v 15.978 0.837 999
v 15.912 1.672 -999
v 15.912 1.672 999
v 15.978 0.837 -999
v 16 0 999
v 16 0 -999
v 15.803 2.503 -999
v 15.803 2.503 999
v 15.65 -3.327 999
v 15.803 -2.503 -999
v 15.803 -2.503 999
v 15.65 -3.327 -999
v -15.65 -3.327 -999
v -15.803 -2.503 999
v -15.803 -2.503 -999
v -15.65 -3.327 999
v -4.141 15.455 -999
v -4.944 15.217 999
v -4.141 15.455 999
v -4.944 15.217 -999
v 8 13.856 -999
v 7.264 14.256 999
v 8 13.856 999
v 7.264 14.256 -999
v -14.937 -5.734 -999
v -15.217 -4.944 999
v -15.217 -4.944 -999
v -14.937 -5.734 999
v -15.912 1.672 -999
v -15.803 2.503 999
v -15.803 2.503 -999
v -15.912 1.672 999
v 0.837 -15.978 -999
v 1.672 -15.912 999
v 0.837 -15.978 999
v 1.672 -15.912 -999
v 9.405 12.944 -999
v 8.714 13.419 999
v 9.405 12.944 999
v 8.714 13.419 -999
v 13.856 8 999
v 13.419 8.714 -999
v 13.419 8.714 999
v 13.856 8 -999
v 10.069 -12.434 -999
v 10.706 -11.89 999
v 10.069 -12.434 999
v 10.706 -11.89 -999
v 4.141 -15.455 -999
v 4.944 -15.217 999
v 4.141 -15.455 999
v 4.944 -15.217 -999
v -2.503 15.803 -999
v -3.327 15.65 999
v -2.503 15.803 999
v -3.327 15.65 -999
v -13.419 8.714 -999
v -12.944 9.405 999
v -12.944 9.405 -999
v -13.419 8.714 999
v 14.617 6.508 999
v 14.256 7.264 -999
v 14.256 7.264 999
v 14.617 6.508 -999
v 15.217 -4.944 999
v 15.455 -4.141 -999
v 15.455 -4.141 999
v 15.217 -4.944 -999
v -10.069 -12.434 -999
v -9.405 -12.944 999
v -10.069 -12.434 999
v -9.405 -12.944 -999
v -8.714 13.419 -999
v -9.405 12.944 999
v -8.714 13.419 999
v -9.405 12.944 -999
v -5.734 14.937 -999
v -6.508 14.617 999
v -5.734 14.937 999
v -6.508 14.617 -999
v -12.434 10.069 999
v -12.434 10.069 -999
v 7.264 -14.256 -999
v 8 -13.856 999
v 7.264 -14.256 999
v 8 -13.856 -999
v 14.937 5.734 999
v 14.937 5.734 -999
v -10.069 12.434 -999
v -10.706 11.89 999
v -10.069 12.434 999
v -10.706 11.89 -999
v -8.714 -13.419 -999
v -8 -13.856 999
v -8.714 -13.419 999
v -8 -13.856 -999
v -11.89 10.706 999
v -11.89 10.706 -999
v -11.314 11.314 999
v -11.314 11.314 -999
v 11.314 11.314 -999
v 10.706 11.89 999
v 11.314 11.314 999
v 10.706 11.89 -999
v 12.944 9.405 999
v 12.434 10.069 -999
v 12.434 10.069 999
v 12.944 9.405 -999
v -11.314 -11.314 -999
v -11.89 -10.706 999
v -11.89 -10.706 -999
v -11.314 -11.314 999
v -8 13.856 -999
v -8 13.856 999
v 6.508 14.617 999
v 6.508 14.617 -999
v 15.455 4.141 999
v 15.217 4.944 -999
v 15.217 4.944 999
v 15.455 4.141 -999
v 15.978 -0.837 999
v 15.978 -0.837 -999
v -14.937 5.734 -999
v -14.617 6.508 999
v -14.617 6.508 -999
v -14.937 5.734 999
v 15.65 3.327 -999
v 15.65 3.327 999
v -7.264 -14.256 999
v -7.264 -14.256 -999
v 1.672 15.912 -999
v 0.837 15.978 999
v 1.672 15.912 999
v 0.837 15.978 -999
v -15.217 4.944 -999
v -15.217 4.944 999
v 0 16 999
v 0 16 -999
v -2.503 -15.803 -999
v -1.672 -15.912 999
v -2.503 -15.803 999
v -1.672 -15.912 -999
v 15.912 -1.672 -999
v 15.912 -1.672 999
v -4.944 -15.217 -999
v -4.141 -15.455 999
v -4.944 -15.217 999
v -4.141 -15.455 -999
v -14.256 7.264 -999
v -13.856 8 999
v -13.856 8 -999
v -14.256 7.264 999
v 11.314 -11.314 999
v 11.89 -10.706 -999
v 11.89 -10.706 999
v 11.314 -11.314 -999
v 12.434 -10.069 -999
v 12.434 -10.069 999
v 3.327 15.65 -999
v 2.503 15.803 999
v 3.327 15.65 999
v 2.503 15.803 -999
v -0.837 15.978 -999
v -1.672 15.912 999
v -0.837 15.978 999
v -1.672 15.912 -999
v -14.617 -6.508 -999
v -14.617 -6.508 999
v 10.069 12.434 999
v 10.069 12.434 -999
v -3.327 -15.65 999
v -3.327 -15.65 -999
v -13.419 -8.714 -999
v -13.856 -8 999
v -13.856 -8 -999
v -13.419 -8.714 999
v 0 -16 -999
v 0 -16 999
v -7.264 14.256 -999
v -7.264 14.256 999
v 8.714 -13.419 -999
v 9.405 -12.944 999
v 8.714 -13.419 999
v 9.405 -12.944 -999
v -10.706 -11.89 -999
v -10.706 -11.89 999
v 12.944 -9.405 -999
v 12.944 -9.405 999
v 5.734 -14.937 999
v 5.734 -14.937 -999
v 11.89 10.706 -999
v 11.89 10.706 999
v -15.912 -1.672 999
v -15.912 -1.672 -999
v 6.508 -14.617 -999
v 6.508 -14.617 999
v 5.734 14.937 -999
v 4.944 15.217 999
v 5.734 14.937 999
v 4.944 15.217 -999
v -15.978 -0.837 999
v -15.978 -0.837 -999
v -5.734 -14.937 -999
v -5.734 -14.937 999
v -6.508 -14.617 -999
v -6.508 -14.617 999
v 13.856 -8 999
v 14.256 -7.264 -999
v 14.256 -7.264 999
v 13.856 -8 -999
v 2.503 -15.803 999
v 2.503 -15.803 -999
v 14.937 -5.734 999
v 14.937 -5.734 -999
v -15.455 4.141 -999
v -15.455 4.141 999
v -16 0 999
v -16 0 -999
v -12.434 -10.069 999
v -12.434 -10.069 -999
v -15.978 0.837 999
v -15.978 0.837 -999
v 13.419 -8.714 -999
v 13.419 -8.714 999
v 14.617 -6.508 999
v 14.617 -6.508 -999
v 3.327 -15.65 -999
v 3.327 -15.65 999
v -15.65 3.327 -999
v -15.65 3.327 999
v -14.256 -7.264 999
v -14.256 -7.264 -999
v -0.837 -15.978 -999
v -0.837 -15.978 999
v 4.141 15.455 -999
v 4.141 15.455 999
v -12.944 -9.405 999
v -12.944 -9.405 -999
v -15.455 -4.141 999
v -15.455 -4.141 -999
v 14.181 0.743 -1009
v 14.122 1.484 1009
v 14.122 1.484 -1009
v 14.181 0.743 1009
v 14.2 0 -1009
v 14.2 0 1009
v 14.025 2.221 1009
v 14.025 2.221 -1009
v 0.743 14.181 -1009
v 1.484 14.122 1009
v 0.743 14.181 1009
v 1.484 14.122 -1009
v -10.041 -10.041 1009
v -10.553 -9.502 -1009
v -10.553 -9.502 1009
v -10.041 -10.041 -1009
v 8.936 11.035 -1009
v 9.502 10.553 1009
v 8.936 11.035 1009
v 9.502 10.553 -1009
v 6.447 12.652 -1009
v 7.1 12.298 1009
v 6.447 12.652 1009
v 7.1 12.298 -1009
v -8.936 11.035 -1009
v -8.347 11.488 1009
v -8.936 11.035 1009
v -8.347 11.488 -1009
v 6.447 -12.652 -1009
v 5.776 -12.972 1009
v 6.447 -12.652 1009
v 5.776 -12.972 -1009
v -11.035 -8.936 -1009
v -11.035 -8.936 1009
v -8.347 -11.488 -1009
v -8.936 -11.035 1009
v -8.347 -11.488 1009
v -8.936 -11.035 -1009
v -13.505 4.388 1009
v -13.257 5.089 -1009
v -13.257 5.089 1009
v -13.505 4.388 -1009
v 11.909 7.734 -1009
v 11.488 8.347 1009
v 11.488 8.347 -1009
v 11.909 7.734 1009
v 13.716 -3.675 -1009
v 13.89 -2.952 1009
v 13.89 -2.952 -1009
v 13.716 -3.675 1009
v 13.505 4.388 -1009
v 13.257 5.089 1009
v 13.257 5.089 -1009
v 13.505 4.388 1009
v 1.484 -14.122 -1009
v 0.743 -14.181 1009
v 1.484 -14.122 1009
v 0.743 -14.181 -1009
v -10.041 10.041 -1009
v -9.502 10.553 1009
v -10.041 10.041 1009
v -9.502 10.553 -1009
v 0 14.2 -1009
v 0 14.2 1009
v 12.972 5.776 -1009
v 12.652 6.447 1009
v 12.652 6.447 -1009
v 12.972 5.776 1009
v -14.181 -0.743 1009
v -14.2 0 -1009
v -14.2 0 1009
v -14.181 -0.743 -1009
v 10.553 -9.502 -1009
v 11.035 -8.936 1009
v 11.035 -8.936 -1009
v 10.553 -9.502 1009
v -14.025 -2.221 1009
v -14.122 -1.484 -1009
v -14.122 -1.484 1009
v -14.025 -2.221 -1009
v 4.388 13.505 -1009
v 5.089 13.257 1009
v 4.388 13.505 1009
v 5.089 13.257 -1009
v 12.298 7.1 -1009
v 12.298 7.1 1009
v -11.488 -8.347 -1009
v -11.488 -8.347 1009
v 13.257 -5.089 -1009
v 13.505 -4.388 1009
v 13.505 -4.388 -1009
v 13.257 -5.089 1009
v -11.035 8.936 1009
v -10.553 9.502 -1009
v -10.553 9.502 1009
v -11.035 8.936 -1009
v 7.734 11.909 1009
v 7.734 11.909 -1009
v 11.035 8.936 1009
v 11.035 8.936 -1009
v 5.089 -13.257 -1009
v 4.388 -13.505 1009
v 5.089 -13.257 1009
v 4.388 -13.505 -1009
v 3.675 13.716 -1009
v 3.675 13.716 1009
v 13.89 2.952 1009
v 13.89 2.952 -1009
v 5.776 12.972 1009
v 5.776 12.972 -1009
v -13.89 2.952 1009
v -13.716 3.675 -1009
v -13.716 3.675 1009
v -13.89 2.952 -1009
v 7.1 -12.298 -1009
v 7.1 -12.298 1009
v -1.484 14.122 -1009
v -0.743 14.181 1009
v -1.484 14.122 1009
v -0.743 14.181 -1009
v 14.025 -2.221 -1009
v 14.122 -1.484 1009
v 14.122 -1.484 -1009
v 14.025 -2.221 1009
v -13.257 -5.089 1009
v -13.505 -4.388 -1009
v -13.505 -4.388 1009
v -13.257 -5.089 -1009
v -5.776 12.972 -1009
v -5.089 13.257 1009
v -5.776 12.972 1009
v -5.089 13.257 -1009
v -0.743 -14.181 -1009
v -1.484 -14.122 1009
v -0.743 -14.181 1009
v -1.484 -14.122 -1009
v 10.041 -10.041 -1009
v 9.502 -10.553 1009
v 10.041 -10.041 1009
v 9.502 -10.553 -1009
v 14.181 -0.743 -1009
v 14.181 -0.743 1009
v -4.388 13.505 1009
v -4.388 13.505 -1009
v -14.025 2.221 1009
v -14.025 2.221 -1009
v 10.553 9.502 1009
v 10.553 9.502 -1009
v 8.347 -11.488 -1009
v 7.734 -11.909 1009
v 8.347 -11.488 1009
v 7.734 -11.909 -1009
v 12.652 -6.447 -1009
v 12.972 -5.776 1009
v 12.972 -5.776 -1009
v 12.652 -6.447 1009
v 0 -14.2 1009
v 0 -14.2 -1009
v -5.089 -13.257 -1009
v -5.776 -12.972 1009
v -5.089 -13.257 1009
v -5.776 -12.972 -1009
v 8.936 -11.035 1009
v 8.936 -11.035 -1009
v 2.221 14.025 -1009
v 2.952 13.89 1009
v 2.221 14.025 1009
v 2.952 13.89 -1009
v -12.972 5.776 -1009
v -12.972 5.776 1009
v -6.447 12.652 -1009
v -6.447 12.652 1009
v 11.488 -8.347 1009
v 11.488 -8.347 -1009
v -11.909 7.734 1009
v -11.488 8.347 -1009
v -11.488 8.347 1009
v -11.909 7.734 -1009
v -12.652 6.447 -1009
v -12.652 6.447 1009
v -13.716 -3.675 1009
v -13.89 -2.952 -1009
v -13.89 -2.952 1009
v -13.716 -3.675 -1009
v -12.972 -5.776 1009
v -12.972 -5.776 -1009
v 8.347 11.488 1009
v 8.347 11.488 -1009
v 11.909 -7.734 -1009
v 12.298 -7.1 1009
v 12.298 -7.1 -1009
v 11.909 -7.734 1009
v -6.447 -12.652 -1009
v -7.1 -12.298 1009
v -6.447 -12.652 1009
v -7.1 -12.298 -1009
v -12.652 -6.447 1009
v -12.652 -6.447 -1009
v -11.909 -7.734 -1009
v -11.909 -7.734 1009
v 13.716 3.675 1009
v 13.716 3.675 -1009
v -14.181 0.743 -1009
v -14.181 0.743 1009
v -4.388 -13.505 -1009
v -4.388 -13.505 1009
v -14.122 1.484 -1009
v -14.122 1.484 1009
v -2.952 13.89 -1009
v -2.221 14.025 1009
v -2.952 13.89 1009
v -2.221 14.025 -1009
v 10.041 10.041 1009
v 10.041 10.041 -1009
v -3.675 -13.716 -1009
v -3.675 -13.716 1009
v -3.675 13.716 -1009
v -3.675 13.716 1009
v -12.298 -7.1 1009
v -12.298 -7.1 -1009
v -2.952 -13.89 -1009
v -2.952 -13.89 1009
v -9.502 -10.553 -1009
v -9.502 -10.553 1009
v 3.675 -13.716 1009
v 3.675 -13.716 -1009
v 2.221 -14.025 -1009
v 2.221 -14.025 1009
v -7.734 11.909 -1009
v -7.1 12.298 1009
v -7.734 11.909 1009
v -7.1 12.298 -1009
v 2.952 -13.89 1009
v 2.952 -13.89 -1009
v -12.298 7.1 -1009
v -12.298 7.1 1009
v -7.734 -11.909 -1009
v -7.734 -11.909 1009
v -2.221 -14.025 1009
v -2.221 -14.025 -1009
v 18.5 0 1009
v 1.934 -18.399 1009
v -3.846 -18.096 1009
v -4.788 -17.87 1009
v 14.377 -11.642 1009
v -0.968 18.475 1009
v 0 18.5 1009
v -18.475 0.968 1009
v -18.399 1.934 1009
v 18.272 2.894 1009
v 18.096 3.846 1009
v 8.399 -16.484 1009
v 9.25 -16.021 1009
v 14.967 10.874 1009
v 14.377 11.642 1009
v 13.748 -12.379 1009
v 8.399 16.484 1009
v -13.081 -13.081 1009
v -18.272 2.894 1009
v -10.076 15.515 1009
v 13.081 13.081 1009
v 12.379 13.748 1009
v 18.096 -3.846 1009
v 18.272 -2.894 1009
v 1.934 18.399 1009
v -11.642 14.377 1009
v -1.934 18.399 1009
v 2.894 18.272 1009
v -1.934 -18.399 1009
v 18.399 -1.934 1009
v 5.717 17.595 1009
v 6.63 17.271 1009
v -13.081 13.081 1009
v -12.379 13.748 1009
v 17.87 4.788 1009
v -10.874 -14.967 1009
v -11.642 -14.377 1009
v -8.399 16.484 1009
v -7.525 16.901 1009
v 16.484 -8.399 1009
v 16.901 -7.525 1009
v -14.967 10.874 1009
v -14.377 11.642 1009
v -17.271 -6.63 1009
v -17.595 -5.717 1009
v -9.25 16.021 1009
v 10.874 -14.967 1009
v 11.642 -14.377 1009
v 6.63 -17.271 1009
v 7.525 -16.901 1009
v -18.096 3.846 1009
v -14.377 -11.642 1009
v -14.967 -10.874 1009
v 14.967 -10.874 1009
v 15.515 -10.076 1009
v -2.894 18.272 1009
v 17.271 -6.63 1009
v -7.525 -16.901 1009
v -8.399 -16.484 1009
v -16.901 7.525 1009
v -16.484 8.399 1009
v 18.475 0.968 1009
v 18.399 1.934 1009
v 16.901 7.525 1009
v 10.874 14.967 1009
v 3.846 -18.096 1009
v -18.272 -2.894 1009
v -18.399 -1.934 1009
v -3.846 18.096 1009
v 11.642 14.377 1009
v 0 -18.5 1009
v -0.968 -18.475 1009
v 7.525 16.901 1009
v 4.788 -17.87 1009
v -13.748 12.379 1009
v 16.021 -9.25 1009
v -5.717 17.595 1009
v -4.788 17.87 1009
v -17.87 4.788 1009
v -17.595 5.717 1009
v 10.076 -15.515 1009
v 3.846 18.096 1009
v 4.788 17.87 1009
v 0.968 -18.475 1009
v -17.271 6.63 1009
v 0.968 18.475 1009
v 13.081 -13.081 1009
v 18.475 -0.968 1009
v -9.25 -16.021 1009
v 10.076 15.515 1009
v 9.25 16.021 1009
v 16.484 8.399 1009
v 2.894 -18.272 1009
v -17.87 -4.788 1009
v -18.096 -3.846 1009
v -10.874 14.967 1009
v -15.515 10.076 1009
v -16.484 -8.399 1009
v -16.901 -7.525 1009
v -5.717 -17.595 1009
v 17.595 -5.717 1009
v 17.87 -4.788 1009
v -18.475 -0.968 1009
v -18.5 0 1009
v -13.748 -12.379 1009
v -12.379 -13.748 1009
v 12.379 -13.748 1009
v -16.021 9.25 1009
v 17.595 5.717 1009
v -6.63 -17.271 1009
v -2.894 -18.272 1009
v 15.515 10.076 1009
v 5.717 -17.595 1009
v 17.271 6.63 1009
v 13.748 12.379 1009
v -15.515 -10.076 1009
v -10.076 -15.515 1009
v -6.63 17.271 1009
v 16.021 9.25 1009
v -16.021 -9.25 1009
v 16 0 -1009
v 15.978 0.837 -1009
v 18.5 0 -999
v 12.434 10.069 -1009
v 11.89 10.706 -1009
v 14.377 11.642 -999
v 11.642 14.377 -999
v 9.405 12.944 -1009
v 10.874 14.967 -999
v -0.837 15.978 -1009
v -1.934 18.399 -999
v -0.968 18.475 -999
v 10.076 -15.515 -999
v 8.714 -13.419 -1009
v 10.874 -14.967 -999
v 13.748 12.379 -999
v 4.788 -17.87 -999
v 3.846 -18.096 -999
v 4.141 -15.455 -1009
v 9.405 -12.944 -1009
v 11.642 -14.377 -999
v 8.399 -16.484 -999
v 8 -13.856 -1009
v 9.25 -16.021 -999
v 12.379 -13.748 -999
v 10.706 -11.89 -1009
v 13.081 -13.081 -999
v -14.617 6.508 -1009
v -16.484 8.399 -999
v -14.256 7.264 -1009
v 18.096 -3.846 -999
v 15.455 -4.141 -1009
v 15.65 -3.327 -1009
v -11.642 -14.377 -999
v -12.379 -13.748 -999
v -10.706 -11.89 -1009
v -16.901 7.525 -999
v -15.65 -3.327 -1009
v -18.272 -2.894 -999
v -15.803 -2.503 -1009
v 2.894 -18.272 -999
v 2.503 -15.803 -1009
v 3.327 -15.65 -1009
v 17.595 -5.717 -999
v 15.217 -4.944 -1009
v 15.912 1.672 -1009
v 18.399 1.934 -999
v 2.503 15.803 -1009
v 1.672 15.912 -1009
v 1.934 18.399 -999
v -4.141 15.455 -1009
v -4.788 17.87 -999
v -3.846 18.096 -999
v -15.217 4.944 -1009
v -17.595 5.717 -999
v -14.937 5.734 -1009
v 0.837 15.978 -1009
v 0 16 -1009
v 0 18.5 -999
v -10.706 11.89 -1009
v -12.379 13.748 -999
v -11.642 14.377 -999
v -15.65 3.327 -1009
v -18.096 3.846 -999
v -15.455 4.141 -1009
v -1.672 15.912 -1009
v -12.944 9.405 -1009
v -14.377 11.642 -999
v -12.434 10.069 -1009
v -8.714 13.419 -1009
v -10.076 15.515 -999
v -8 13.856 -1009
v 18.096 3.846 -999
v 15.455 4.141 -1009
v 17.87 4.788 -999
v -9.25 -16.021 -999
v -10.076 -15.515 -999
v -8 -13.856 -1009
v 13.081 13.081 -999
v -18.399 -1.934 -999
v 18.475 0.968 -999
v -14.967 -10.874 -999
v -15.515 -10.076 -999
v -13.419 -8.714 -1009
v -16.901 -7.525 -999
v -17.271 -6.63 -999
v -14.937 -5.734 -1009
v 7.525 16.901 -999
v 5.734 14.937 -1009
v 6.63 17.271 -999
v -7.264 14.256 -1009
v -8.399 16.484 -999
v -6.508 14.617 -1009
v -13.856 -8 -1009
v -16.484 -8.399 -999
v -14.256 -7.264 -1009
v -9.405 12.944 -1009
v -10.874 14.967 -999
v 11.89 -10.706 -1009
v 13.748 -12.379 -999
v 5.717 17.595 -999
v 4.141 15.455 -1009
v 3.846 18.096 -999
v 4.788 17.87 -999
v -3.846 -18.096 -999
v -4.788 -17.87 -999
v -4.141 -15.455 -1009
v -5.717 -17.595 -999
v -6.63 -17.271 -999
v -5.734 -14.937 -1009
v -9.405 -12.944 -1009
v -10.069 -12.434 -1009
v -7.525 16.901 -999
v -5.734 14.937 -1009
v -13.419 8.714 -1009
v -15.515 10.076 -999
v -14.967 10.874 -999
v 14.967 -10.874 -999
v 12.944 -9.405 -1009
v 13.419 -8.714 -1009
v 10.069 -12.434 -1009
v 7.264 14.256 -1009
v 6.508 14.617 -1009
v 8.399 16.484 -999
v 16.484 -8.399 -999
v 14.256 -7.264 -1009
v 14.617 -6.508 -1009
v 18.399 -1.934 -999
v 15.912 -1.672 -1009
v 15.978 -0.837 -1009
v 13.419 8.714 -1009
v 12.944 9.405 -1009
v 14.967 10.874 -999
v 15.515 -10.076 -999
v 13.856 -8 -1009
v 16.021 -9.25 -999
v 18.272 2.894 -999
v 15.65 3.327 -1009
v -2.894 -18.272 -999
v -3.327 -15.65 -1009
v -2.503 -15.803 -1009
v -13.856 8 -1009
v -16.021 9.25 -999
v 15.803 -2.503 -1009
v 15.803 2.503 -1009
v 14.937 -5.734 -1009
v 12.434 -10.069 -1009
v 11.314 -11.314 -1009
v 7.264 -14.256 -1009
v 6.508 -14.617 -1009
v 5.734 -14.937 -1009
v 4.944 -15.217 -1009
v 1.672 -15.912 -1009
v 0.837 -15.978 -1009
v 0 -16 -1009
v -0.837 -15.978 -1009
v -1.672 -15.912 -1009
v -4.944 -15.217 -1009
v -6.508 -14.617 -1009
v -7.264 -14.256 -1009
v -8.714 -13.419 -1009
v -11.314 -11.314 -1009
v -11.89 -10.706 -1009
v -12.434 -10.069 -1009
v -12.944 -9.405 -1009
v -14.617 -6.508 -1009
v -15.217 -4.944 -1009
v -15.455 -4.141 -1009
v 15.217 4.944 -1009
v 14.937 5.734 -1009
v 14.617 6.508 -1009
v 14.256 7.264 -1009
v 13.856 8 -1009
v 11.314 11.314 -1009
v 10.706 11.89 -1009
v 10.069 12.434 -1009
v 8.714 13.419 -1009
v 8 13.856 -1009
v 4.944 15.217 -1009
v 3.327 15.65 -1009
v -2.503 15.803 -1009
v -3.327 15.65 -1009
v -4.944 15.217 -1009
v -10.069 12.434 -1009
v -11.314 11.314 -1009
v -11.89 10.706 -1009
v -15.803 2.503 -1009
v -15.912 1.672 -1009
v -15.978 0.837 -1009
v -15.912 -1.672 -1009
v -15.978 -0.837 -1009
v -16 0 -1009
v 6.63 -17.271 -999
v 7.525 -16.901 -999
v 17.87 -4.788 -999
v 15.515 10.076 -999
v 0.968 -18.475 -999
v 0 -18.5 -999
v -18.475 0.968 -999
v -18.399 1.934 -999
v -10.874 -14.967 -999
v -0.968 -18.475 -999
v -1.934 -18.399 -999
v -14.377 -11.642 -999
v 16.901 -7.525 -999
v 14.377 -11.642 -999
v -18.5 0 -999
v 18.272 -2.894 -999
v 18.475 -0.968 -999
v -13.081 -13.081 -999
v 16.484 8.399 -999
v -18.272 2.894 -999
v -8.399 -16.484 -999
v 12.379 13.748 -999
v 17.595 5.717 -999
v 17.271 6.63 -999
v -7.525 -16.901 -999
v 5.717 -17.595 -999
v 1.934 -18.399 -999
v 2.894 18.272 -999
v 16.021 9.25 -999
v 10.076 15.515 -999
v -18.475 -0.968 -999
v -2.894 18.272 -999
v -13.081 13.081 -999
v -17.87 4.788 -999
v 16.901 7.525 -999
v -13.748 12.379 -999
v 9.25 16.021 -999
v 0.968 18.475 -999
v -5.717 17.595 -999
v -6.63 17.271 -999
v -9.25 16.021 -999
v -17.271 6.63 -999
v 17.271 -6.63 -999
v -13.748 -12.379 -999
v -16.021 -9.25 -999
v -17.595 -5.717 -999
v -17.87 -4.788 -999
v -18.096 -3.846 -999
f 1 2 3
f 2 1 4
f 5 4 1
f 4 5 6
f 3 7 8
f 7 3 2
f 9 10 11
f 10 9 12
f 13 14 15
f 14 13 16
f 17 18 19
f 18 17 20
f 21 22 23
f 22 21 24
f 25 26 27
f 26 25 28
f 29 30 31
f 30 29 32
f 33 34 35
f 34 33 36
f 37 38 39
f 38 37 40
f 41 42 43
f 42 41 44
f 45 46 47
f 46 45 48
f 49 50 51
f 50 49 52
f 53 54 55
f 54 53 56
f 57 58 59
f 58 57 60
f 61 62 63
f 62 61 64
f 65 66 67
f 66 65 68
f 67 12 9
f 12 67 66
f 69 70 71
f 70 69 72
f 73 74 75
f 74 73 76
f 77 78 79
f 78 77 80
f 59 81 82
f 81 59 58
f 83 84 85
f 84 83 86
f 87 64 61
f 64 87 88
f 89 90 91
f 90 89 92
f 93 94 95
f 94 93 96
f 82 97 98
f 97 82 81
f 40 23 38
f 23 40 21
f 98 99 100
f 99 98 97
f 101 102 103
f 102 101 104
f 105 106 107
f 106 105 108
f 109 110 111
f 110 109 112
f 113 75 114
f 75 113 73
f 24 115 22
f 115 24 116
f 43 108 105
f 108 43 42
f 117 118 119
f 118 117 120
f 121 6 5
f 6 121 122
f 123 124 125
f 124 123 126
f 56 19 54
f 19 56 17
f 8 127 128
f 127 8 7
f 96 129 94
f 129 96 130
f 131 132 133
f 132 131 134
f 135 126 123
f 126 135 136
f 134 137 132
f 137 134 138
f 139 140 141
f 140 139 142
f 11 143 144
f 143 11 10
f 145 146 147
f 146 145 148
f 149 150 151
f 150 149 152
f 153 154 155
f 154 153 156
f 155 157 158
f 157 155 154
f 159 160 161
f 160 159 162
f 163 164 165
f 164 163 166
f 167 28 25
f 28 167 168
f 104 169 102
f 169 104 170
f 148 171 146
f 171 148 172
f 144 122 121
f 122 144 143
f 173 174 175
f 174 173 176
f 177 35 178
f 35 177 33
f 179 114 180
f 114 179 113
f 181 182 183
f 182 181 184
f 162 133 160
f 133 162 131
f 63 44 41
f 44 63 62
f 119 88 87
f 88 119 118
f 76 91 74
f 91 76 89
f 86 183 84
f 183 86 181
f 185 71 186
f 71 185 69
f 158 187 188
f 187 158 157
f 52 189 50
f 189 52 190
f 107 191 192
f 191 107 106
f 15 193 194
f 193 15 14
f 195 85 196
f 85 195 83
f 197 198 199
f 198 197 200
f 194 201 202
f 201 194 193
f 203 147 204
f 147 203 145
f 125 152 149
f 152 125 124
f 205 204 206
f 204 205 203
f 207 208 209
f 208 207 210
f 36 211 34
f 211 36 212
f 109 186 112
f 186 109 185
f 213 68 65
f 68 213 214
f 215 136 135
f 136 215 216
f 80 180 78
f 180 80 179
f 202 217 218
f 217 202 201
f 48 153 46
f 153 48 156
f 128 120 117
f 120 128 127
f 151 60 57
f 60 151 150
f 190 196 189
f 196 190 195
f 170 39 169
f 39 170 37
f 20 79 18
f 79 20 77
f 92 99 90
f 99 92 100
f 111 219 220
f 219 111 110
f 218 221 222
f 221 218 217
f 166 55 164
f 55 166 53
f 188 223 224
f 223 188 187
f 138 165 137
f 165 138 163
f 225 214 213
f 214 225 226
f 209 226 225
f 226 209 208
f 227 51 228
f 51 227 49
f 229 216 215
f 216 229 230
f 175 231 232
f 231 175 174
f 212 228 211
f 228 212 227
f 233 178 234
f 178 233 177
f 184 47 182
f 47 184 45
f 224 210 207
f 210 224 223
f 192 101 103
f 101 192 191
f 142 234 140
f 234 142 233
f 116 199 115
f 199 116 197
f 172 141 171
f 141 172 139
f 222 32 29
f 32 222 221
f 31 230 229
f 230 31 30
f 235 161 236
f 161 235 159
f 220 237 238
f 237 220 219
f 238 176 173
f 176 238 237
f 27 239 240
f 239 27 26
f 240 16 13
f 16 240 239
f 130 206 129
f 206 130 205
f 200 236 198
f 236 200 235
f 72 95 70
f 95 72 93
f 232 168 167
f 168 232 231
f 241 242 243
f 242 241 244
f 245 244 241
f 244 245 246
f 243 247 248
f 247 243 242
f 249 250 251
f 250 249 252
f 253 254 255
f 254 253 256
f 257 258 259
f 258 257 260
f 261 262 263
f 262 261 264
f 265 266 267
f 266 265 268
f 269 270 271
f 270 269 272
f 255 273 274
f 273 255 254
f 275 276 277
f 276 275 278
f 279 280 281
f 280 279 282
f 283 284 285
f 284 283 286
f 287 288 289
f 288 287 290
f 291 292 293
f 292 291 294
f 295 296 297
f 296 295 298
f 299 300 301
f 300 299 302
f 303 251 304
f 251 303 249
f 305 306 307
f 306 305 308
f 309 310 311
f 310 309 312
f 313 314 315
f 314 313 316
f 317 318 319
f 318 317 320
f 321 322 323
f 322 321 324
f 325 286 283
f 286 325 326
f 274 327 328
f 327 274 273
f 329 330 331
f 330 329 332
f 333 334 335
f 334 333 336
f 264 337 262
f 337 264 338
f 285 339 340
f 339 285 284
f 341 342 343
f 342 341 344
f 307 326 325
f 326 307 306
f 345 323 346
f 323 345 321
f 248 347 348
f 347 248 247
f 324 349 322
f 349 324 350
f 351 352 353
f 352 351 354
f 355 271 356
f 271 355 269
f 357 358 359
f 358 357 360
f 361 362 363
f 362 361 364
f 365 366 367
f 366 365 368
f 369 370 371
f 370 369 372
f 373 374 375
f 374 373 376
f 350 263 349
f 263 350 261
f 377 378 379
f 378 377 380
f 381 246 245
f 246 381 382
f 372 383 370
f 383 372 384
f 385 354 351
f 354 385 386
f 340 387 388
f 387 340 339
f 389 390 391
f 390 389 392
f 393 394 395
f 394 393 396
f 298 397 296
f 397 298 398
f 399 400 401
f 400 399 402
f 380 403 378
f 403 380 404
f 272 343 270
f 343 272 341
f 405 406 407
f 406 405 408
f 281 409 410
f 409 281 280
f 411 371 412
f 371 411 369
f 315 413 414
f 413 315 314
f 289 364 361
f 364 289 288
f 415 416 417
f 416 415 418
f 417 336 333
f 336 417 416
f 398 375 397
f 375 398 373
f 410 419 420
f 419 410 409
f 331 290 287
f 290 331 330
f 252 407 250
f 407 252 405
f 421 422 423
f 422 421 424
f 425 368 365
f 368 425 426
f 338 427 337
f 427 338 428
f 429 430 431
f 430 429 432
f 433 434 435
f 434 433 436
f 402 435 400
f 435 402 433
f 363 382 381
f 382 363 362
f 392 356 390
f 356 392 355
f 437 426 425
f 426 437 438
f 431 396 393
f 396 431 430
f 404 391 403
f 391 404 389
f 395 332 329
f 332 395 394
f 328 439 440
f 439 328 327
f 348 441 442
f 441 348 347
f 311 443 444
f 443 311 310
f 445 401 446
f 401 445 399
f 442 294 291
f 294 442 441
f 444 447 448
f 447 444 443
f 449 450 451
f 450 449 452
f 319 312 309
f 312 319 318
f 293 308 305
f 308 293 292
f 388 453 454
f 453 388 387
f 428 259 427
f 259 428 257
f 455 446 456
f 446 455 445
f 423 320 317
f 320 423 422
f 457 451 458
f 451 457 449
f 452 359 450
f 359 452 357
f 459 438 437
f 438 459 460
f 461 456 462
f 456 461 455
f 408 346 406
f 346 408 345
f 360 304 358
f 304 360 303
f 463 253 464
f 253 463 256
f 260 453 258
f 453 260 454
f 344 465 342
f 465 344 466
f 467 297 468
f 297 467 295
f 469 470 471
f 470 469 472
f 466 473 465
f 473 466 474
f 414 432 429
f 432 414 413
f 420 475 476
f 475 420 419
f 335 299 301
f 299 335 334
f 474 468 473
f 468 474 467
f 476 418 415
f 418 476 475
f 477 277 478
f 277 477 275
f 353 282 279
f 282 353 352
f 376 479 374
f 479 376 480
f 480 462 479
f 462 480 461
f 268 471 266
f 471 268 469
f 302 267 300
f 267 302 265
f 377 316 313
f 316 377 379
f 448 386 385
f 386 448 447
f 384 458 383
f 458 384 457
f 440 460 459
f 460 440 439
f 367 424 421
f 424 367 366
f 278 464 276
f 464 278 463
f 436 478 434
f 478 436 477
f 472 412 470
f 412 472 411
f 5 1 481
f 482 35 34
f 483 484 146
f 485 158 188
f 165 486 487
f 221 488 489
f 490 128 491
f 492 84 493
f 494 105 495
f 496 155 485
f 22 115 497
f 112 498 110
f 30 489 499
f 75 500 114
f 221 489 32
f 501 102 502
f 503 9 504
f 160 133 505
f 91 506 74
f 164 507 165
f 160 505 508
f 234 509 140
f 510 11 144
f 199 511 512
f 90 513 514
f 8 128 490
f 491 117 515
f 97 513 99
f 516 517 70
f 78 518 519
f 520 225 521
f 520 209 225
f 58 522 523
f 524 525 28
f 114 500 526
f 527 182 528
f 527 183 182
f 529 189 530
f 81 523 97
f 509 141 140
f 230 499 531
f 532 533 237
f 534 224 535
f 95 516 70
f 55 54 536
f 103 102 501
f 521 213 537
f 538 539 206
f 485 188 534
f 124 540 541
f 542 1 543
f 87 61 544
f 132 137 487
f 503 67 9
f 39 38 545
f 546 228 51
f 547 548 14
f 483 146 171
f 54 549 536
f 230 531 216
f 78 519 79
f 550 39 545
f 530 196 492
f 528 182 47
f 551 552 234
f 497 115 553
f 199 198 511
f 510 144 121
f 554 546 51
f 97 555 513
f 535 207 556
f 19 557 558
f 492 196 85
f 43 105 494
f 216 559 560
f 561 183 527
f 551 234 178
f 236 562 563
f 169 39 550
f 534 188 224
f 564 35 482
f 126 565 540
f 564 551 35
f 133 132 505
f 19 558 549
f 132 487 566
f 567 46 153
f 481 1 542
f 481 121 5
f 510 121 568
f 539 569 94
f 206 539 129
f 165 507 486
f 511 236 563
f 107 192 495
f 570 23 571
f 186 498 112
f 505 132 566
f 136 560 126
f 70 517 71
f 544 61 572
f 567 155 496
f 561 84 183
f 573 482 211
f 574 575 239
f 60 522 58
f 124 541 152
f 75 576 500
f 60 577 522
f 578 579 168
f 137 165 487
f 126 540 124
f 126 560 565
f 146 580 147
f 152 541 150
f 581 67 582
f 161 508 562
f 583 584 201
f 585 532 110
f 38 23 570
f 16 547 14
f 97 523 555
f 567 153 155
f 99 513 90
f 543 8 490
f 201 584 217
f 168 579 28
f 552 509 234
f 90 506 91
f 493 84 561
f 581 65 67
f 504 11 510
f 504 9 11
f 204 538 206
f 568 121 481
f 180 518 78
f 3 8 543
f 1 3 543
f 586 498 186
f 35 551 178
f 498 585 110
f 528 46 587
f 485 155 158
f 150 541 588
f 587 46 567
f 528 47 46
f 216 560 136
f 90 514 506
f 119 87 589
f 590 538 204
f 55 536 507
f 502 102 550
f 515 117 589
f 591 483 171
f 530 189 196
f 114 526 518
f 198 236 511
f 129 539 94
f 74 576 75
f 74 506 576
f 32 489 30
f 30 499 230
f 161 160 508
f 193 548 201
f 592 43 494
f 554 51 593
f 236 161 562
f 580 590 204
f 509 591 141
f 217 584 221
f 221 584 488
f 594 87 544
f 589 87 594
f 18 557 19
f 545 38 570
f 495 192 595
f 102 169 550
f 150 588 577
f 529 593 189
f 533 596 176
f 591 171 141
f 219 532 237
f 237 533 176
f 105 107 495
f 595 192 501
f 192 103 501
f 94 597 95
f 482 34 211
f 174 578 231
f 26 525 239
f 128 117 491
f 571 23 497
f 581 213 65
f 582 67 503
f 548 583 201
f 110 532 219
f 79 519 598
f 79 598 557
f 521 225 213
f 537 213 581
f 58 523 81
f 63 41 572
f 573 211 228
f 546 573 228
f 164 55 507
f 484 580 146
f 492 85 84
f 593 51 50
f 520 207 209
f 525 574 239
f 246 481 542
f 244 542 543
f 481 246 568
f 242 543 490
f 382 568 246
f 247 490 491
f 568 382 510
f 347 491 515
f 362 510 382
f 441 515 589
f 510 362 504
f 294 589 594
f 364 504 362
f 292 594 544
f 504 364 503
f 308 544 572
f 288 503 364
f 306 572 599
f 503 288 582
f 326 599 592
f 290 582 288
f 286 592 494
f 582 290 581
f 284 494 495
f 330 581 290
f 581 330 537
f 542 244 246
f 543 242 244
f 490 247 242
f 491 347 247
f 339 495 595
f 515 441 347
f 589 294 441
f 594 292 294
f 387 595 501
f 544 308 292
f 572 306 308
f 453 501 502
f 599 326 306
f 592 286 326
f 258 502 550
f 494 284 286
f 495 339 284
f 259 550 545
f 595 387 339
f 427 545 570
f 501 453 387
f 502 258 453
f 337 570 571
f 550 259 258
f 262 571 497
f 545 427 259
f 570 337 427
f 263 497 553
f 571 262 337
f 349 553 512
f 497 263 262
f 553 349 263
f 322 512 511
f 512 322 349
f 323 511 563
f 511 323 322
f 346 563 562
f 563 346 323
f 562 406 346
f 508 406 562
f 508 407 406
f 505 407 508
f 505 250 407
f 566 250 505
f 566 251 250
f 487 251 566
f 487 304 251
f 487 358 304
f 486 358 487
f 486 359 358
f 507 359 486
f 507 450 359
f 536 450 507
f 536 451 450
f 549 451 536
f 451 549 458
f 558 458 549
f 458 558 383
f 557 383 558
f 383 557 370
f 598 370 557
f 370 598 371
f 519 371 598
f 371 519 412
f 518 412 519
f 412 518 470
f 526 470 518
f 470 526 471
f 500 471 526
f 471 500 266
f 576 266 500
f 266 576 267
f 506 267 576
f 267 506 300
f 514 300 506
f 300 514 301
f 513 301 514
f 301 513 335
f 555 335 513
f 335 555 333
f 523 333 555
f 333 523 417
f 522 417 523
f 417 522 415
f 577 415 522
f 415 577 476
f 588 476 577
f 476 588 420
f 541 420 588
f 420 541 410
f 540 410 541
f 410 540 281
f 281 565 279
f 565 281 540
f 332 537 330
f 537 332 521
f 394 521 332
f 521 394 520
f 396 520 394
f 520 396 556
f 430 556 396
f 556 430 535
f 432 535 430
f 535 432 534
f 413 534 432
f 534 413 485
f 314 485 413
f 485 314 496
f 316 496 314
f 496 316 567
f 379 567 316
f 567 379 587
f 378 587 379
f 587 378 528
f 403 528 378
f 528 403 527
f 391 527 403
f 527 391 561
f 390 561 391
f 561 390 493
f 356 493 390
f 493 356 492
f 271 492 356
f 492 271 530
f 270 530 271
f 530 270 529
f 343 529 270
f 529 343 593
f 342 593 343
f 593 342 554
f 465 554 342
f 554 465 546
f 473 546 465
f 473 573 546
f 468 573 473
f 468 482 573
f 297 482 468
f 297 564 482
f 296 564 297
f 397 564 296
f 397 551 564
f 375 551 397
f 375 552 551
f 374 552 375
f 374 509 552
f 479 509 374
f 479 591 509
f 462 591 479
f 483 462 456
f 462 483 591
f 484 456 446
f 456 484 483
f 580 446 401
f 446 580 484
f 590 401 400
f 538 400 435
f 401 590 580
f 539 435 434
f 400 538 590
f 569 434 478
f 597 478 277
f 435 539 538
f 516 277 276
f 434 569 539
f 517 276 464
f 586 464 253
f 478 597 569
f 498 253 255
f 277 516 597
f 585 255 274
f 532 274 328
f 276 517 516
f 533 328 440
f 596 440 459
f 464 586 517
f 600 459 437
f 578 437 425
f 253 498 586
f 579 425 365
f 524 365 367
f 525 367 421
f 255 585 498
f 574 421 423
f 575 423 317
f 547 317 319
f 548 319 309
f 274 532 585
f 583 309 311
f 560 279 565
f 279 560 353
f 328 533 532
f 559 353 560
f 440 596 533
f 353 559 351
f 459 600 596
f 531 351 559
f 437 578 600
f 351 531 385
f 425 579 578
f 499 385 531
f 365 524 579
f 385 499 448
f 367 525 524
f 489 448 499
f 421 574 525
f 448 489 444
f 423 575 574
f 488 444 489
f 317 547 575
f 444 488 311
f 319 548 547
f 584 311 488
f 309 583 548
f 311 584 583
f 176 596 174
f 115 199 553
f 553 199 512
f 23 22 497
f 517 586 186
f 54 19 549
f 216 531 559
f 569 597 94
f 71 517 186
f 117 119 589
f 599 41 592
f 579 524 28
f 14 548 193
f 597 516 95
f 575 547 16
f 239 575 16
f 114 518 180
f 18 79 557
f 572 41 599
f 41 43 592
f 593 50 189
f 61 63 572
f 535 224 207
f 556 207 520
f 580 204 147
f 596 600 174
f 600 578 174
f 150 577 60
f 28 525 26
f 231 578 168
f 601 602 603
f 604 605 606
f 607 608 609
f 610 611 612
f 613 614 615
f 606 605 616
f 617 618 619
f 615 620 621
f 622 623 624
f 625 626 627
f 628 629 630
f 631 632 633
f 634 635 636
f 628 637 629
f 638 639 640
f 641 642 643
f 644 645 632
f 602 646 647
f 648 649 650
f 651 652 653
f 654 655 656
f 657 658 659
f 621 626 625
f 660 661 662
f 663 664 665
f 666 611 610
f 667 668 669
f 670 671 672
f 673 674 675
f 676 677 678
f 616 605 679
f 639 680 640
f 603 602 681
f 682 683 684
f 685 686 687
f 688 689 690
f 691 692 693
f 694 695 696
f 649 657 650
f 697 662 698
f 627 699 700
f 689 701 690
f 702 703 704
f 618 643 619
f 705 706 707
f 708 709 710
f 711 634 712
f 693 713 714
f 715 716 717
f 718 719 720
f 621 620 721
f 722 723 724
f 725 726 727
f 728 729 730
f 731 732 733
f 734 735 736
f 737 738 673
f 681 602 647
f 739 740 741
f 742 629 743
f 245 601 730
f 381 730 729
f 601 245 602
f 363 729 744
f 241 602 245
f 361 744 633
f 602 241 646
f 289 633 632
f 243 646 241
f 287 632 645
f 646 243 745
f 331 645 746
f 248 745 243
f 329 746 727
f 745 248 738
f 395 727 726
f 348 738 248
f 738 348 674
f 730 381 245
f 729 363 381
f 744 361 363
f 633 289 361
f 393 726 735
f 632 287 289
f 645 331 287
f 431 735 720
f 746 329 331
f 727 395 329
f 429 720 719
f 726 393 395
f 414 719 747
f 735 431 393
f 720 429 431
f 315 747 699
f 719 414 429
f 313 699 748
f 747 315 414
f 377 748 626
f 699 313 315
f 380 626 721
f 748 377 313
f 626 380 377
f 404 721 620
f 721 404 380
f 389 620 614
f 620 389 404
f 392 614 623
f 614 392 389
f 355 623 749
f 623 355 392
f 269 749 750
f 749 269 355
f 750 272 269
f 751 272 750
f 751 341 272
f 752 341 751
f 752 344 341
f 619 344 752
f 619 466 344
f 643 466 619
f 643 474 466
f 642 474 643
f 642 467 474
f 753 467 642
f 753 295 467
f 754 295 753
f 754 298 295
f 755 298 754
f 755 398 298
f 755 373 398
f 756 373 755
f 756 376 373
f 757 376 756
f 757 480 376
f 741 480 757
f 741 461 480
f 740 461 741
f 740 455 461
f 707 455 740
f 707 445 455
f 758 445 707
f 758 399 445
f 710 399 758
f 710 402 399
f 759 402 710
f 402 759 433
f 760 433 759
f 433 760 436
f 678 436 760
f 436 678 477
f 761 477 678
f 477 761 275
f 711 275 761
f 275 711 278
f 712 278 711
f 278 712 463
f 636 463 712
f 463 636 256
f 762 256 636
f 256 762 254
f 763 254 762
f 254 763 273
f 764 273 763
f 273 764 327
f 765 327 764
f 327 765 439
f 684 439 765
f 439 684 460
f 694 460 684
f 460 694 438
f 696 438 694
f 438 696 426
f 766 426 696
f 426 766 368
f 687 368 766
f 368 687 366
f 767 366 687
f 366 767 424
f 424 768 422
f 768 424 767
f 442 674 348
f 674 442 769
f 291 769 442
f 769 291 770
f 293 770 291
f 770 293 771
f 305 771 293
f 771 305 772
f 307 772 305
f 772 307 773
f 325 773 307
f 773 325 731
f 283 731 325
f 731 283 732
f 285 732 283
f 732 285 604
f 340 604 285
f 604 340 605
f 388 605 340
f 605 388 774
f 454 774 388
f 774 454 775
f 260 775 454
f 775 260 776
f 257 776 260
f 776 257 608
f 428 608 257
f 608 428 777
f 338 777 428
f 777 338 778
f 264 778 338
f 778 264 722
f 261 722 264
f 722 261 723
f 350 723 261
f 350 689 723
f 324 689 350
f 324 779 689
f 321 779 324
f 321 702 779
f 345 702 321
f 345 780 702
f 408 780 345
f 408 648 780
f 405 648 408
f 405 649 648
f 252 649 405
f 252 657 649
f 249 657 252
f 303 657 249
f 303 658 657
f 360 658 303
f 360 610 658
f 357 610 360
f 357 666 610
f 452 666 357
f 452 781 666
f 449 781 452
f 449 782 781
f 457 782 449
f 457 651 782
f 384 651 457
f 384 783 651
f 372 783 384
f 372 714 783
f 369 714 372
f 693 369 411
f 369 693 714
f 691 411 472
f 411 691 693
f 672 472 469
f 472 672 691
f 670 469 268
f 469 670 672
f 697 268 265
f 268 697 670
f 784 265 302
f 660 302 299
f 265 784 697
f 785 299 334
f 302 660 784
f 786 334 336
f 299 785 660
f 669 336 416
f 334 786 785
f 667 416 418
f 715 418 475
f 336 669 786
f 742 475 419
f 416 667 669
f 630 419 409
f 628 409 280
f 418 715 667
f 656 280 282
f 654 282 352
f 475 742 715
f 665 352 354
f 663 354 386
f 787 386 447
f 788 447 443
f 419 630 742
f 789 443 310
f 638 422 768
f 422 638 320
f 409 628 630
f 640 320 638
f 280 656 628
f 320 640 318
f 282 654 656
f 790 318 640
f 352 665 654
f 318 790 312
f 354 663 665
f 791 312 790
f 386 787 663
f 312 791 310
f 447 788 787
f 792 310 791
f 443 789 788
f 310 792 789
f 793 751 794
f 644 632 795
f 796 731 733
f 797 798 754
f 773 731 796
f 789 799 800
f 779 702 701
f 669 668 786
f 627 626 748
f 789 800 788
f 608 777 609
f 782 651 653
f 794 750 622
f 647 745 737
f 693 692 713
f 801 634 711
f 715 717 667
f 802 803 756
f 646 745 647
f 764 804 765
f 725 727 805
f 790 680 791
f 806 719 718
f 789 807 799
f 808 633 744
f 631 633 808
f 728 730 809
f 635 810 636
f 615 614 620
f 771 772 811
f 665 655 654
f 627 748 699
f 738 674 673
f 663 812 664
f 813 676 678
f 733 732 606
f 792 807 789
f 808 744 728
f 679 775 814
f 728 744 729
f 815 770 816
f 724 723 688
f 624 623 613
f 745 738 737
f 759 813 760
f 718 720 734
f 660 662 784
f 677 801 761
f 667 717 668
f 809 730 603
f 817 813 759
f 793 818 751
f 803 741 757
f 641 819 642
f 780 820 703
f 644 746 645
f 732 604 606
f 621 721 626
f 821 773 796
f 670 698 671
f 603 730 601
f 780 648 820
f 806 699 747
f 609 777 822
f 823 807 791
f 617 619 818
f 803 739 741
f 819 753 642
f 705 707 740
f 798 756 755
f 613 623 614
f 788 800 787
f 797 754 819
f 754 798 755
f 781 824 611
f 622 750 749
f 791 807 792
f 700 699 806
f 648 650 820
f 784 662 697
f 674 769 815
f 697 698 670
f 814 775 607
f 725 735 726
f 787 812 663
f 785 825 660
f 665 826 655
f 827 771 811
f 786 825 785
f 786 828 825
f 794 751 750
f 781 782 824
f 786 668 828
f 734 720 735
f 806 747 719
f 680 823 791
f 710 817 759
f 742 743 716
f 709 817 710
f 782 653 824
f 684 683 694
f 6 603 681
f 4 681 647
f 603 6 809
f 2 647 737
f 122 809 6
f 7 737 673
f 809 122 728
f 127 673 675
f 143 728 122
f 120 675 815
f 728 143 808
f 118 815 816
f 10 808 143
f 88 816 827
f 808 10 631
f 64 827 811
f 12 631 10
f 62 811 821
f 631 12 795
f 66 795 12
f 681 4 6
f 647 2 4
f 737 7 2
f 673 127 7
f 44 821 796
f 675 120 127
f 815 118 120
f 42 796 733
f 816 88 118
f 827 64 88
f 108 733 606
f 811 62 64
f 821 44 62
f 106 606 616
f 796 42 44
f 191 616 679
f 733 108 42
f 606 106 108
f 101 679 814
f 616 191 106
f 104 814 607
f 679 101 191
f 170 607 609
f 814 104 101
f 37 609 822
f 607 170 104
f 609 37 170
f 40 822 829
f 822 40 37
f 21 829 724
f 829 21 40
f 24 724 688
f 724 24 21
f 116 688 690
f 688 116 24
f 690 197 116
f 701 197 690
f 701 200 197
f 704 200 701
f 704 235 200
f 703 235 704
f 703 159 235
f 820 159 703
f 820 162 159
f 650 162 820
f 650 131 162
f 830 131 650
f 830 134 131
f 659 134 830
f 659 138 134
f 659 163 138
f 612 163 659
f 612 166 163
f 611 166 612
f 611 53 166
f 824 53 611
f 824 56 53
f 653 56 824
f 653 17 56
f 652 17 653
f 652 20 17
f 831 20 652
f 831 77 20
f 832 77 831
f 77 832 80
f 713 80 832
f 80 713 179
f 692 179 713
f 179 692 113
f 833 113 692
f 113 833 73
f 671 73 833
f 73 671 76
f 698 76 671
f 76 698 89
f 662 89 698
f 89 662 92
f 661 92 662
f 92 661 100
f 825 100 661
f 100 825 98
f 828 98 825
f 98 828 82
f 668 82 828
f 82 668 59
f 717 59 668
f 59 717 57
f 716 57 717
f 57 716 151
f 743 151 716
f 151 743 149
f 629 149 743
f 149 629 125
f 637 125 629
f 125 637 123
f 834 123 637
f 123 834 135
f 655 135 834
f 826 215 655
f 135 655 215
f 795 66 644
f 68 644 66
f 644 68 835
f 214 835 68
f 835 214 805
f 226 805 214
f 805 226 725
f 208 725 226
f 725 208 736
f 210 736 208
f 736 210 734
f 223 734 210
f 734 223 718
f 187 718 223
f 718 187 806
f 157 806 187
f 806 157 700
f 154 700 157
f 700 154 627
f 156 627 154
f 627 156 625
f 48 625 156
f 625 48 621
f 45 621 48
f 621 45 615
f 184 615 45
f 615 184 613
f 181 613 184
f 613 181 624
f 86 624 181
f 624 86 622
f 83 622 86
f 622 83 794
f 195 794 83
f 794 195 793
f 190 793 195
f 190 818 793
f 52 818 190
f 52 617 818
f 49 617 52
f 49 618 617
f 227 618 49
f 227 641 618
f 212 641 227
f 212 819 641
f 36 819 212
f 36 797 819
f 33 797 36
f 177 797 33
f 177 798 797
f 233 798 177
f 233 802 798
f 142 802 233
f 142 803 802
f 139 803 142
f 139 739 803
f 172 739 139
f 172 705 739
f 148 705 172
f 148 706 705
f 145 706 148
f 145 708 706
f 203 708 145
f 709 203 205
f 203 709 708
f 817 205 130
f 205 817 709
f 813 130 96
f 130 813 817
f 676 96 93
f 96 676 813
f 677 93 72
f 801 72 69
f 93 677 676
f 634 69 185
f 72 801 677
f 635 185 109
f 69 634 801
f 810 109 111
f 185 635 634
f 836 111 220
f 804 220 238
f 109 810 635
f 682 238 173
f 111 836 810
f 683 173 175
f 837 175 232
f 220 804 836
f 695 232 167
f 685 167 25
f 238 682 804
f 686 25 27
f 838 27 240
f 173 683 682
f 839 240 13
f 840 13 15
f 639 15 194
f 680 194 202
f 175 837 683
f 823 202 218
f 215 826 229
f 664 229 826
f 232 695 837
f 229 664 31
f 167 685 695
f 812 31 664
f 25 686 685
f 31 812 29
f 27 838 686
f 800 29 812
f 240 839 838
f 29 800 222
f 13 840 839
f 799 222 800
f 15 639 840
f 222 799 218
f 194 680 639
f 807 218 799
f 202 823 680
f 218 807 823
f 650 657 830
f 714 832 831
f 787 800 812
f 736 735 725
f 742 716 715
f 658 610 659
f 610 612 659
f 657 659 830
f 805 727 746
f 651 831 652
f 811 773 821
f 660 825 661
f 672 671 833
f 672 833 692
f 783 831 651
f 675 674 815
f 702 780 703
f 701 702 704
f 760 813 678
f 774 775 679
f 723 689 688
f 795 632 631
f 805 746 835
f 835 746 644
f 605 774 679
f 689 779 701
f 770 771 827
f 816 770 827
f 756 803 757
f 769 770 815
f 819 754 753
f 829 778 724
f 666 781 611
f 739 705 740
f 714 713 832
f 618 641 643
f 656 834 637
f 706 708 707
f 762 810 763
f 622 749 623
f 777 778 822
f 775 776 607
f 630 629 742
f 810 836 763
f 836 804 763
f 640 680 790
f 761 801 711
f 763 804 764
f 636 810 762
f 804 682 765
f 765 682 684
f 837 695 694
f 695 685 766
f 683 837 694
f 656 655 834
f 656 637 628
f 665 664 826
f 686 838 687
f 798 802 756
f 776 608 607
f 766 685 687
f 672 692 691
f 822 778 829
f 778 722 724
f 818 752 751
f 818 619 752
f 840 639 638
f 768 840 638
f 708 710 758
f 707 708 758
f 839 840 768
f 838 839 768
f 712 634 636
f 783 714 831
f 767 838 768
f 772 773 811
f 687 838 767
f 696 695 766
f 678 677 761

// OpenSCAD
// HT 32 pipe, 2000 mm long (single connected solid)
// Fix: avoid coplanar/near-coplanar boolean surfaces that can render "blank".
// Use explicit Z extents (non-centered) and slightly different inner/outer heights.

outer_diameter = 32;      // mm
wall_thickness = 1.8;     // mm
length = 2000;            // mm

socket_len = 10;          // mm
socket_od_extra = 5;      // mm
overlap = 1.0;            // mm (guaranteed physical overlap)

eps = 0.2;                // mm (boolean robustness)
$fn = 120;

module pipe_shell_z(z0, z1, od, wt) {
    h = z1 - z0;
    difference() {
        translate([0,0,z0]) cylinder(h=h, d=od, center=false);
        // inner cut slightly longer to avoid coplanar faces
        translate([0,0,z0 - eps]) cylinder(h=h + 2*eps, d=od - 2*wt, center=false);
    }
}

module end_socket_z(z0, z1, od, od_extra, wt) {
    h = z1 - z0;
    difference() {
        // simple flared socket OD
        translate([0,0,z0]) cylinder(h=h, d1=od, d2=od + od_extra, center=false);
        // inner cut slightly longer to avoid coplanar faces
        translate([0,0,z0 - eps]) cylinder(h=h + 2*eps, d=od - 2*wt, center=false);
    }
}

module ht_pipe() {
    union() {
        // Main pipe spans [-length/2, +length/2]
        pipe_shell_z(-length/2, length/2, outer_diameter, wall_thickness);

        // End sockets overlap into main pipe by 'overlap' to ensure one connected solid
        end_socket_z(length/2 - overlap, length/2 - overlap + socket_len,
                     outer_diameter, socket_od_extra, wall_thickness);

        end_socket_z(-length/2 + overlap - socket_len, -length/2 + overlap,
                     outer_diameter, socket_od_extra, wall_thickness);
    }
}

ht_pipe();
